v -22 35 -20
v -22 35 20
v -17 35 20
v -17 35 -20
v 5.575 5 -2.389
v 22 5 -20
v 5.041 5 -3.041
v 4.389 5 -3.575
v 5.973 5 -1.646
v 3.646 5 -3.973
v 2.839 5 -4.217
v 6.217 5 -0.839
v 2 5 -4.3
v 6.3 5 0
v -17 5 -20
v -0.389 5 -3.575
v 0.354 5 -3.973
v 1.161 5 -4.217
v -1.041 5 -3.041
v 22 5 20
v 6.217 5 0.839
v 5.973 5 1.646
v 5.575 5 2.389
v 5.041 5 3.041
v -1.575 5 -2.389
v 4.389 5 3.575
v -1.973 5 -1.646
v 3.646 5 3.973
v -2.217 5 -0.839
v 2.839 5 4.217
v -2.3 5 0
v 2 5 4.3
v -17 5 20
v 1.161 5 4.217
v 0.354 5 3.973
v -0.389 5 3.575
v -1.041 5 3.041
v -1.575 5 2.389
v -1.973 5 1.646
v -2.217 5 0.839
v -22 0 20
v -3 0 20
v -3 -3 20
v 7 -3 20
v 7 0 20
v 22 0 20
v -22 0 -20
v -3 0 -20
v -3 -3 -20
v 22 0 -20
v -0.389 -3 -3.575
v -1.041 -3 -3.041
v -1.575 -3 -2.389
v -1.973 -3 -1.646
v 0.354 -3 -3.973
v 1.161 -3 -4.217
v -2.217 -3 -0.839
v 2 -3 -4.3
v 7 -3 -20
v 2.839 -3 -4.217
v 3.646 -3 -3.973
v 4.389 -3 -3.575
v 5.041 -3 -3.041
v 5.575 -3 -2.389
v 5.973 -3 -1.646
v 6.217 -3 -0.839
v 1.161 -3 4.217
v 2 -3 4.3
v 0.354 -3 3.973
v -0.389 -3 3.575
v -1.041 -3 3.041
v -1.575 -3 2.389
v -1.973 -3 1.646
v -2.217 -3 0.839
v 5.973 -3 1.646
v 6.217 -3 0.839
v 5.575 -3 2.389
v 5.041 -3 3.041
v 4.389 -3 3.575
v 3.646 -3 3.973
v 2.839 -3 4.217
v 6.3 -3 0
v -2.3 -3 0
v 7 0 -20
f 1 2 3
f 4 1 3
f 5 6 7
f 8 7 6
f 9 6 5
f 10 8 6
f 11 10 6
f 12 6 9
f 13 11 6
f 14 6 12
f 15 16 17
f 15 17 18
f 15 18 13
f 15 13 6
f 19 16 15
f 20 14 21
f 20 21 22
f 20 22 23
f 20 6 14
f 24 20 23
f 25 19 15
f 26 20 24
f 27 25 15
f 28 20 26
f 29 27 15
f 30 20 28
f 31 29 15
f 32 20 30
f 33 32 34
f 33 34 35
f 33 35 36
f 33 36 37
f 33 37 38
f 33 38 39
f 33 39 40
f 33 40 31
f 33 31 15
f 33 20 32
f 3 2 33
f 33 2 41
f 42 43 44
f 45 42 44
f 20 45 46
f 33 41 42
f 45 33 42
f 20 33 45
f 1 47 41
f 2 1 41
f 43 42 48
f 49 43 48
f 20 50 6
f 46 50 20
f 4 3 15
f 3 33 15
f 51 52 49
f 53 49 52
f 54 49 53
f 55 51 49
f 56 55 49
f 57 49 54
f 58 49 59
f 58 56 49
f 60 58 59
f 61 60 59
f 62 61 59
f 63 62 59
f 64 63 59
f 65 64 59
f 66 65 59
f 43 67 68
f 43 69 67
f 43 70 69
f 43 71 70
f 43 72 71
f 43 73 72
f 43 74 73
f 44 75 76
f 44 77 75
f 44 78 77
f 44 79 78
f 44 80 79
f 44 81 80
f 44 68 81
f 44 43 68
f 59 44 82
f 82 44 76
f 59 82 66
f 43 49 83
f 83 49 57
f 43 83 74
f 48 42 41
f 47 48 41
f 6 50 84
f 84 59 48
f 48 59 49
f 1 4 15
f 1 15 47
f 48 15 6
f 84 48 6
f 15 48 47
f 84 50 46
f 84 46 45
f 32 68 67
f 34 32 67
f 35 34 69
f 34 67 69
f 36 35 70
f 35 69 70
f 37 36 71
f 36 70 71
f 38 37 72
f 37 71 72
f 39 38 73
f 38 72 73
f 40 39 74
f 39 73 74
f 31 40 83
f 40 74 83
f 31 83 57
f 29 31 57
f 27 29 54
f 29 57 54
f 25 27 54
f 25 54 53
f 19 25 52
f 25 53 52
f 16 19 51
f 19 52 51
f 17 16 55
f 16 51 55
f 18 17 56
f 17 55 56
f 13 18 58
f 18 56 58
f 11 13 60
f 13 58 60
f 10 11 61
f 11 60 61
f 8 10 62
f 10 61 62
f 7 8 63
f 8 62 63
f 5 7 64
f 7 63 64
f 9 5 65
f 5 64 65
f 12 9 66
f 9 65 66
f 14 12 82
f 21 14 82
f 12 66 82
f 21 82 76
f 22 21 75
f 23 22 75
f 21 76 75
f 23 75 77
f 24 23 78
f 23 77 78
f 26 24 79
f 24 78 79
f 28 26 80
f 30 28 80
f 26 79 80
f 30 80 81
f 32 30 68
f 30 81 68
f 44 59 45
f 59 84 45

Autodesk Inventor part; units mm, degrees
ref_plane "YZ Plane" through (0, 0, 0) normal (1, 0, 0) x (0, 1, 0)
ref_plane "XZ Plane" through (0, 0, 0) normal (0, 1, 0) x (-1, 0, 0)
ref_plane "XY Plane" through (0, 0, 0) normal (0, 0, 1) x (1, 0, 0)
sketch "Sketch1" plane through (0, 0, 0) normal (0, 1, 0) x (-1, 0, 0)
  line L0 (-22, 20) -> (22, 20)
  line L1 (22, 20) -> (22, -20)
  line L2 (22, -20) -> (-22, -20)
  line L3 (-22, -20) -> (-22, 20)
  line L4 (-22, 20) -> (22, -20) construction
  line L5 (22, 20) -> (-22, -20) construction
  point P0 (0, 0)
  dimension "d0" = 44
  dimension "d1" = 40
extrude "Extrusion1" add sketch "Sketch1" along normal blind 5
sketch "Sketch2" plane through (0, 0, 0) normal (0, -1, 0) x (1, 0, 0)
  line L0 (22, -20) -> (-22, -20) projected
  line L1 (-22, 20) -> (22, 20) projected
  line L2 (-3, -20) -> (7, -20)
  line L3 (7, -20) -> (7, 20)
  line L4 (7, 20) -> (-3, 20)
  line L5 (-3, 20) -> (-3, -20)
  line L6 (22, 20) -> (22, -20) projected
  point P0 (-3, 20)
  dimension "d7" = 10
  dimension "d8" = 15
extrude "Extrusion2" add sketch "Sketch2" along normal blind 3 contours L0 L5 L1 L3
sketch "Sketch3" plane through (0, 5, 0) normal (0, 1, 0) x (1, 0, 0)
  line L0 (-22, -20) -> (22, -20) projected
  line L1 (-22, -20) -> (-17, -20)
  line L2 (-17, -20) -> (-17, 20)
  line L3 (-17, 20) -> (-22, 20)
  line L4 (-22, 20) -> (-22, -20)
  point P0 (0, 0)
  point P1 (-17, -20)
  dimension "d9" = 5
  dimension "d10" = 40
extrude "Extrusion3" add sketch "Sketch3" along normal blind 30
sketch "Sketch4" plane through (0, 5, 0) normal (0, 1, 0) x (1, 0, 0)
  line L0 (22, -20) -> (22, 20) projected
  point P0 (0, 0)
  point P1 (2, 0)
  point P2 (22, 0)
  dimension "d13" = 20
hole "Hole1" at (2, 5, 0) direction (0, -1, 0) diameter 8.6 end through all
properties part number "ER_Stopper_Rexroth"
